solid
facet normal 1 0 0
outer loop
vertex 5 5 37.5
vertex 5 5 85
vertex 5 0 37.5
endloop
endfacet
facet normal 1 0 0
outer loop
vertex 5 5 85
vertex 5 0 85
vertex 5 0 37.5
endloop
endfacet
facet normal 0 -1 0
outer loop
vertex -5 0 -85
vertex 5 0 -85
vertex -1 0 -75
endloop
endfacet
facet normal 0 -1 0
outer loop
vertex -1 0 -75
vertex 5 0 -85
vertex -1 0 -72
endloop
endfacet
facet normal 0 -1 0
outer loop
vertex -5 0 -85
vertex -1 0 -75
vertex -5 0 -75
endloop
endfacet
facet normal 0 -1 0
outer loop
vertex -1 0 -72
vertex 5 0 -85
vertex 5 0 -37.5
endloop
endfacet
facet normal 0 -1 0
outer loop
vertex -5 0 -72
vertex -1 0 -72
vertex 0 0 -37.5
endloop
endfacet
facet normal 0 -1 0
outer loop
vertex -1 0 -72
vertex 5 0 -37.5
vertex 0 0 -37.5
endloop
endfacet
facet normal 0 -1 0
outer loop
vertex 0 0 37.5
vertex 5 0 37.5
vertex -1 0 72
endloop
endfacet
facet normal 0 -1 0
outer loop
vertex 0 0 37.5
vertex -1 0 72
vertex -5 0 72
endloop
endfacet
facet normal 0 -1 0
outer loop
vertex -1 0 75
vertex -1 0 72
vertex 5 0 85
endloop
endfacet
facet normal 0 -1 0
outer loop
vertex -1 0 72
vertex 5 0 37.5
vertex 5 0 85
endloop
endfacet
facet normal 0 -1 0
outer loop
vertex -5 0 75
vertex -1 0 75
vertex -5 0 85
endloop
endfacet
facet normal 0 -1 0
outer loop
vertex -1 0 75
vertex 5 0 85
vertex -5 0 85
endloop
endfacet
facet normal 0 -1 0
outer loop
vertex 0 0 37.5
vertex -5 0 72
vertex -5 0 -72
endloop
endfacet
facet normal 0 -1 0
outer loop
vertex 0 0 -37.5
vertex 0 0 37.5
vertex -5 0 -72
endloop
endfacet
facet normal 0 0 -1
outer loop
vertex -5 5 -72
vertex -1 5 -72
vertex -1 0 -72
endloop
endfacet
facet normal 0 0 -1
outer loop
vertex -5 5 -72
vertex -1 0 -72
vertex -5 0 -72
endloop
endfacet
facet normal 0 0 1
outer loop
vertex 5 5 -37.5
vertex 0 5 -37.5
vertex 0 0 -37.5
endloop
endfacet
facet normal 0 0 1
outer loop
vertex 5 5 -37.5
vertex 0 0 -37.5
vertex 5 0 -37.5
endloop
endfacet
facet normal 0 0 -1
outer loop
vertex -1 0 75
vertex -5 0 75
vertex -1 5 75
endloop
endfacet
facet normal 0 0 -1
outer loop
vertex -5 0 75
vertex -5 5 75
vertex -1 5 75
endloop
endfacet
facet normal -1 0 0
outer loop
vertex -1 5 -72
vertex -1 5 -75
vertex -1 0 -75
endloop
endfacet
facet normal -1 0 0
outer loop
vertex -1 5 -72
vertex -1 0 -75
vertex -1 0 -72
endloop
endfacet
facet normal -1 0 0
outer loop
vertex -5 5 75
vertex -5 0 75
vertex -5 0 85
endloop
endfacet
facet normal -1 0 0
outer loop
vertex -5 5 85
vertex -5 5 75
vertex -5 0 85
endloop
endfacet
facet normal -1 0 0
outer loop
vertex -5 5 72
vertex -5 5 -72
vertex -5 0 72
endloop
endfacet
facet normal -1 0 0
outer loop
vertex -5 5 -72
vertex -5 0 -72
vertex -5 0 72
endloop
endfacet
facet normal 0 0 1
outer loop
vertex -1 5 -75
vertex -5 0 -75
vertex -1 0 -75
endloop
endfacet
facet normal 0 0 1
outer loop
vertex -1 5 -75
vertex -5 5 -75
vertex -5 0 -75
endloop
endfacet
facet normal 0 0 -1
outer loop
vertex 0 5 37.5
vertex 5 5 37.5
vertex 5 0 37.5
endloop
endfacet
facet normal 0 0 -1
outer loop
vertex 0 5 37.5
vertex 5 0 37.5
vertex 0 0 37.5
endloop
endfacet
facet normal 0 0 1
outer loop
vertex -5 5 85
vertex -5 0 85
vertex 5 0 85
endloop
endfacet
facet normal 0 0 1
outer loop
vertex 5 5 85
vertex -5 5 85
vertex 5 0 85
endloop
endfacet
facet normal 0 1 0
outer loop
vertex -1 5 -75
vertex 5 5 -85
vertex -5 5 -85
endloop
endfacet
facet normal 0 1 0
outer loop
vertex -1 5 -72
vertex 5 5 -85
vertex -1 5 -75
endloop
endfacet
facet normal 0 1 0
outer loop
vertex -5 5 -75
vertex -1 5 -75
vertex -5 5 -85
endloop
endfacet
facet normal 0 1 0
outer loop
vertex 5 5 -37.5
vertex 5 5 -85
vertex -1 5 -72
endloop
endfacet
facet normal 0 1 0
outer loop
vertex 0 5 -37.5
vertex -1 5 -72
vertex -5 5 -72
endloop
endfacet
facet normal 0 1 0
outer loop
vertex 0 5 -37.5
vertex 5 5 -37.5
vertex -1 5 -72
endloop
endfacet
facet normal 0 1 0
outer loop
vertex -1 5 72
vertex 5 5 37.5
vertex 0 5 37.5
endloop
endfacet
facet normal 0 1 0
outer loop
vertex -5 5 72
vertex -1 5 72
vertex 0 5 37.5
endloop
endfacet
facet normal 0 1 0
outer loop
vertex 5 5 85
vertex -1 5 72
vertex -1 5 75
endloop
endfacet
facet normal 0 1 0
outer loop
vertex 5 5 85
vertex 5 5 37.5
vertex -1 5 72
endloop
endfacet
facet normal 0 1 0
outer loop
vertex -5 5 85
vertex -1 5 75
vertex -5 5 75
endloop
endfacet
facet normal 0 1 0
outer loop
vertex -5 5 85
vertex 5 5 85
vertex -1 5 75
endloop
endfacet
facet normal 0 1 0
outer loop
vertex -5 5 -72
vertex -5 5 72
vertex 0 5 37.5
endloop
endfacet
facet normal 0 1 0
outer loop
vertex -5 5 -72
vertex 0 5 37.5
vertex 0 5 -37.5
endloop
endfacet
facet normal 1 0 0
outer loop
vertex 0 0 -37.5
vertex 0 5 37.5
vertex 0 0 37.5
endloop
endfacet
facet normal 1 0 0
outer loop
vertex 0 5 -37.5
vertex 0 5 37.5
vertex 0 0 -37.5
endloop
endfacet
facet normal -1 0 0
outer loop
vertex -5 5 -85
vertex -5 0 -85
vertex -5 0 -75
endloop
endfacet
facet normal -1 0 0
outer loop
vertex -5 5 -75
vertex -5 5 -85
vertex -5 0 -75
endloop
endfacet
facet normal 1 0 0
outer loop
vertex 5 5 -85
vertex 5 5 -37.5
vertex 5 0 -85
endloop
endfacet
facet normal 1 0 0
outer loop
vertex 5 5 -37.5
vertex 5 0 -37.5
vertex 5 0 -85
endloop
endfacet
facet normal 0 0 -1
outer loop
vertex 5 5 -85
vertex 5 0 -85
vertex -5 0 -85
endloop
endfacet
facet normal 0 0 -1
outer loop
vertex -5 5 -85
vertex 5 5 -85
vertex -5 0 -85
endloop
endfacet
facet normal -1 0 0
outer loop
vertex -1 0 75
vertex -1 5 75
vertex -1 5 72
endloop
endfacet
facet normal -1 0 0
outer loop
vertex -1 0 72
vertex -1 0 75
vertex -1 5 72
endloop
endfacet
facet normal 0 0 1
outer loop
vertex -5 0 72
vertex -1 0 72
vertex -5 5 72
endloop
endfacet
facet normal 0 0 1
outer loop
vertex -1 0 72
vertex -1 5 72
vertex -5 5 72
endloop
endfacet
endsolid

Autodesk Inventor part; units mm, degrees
ref_plane "YZ Plane" through (0, 0, 0) normal (1, 0, 0) x (0, 1, 0)
ref_plane "XZ Plane" through (0, 0, 0) normal (0, 1, 0) x (-1, 0, 0)
ref_plane "XY Plane" through (0, 0, 0) normal (0, 0, 1) x (1, 0, 0)
sketch "Sketch1" plane through (0, 0, 0) normal (0, 1, 0) x (-1, 0, 0)
  line L0 (5, 85) -> (-5, 85)
  line L1 (-5, 85) -> (-5, -85)
  line L2 (-5, -85) -> (5, -85)
  line L3 (5, -85) -> (5, 85)
  line L4 (5, 85) -> (-5, -85) construction
  line L5 (-5, 85) -> (5, -85) construction
  point P0 (0, 0)
  dimension "d0" = 170
  dimension "d1" = 10
extrude "Extrusion1" add sketch "Sketch1" along normal blind 5
sketch "Sketch2" plane through (0, 5, 0) normal (0, 1, 0) x (1, 0, 0)
  line L0 (-5, 85) -> (-5, -85) projected
  line L1 (-5, -75) -> (-1, -75)
  line L2 (-1, -75) -> (-1, -72)
  line L3 (-1, -72) -> (-5, -72)
  line L4 (-5, -72) -> (-5, -75)
  line L5 (-5, -85) -> (5, -85) projected
  line L6 (5, 0) -> (-5, 0) construction
  line L7 (-5, 75) -> (-1, 75)
  line L8 (-1, 75) -> (-1, 72)
  line L9 (-1, 72) -> (-5, 72)
  line L10 (-5, 72) -> (-5, 75)
  point P0 (0, 0)
  point P1 (-5, 75)
  point P2 (-5, 72)
  dimension "d4" = 3
  dimension "d5" = 4
  dimension "d6" = 10
extrude "Extrusion2" cut sketch "Sketch2" against normal blind 5
sketch "Sketch3" plane through (0, 5, 0) normal (0, 1, 0) x (1, 0, 0)
  line L0 (0, 37.5) -> (10, 37.5)
  line L1 (10, 37.5) -> (10, -37.5)
  line L2 (10, -37.5) -> (0, -37.5)
  line L3 (0, -37.5) -> (0, 37.5)
  line L4 (5, -85) -> (5, 85) projected
  line L5 (0, 37.5) -> (10, -37.5) construction
  line L6 (10, 37.5) -> (0, -37.5) construction
  point P0 (0, 0)
  point P1 (5, 0)
  point P2 (5, -37.5)
  point P3 (5, 37.5)
  dimension "d9" = 75
  dimension "d10" = 5
extrude "Extrusion3" cut sketch "Sketch3" against normal blind 10 contours L0 L4 L2 L3
properties part number "Gel top"
